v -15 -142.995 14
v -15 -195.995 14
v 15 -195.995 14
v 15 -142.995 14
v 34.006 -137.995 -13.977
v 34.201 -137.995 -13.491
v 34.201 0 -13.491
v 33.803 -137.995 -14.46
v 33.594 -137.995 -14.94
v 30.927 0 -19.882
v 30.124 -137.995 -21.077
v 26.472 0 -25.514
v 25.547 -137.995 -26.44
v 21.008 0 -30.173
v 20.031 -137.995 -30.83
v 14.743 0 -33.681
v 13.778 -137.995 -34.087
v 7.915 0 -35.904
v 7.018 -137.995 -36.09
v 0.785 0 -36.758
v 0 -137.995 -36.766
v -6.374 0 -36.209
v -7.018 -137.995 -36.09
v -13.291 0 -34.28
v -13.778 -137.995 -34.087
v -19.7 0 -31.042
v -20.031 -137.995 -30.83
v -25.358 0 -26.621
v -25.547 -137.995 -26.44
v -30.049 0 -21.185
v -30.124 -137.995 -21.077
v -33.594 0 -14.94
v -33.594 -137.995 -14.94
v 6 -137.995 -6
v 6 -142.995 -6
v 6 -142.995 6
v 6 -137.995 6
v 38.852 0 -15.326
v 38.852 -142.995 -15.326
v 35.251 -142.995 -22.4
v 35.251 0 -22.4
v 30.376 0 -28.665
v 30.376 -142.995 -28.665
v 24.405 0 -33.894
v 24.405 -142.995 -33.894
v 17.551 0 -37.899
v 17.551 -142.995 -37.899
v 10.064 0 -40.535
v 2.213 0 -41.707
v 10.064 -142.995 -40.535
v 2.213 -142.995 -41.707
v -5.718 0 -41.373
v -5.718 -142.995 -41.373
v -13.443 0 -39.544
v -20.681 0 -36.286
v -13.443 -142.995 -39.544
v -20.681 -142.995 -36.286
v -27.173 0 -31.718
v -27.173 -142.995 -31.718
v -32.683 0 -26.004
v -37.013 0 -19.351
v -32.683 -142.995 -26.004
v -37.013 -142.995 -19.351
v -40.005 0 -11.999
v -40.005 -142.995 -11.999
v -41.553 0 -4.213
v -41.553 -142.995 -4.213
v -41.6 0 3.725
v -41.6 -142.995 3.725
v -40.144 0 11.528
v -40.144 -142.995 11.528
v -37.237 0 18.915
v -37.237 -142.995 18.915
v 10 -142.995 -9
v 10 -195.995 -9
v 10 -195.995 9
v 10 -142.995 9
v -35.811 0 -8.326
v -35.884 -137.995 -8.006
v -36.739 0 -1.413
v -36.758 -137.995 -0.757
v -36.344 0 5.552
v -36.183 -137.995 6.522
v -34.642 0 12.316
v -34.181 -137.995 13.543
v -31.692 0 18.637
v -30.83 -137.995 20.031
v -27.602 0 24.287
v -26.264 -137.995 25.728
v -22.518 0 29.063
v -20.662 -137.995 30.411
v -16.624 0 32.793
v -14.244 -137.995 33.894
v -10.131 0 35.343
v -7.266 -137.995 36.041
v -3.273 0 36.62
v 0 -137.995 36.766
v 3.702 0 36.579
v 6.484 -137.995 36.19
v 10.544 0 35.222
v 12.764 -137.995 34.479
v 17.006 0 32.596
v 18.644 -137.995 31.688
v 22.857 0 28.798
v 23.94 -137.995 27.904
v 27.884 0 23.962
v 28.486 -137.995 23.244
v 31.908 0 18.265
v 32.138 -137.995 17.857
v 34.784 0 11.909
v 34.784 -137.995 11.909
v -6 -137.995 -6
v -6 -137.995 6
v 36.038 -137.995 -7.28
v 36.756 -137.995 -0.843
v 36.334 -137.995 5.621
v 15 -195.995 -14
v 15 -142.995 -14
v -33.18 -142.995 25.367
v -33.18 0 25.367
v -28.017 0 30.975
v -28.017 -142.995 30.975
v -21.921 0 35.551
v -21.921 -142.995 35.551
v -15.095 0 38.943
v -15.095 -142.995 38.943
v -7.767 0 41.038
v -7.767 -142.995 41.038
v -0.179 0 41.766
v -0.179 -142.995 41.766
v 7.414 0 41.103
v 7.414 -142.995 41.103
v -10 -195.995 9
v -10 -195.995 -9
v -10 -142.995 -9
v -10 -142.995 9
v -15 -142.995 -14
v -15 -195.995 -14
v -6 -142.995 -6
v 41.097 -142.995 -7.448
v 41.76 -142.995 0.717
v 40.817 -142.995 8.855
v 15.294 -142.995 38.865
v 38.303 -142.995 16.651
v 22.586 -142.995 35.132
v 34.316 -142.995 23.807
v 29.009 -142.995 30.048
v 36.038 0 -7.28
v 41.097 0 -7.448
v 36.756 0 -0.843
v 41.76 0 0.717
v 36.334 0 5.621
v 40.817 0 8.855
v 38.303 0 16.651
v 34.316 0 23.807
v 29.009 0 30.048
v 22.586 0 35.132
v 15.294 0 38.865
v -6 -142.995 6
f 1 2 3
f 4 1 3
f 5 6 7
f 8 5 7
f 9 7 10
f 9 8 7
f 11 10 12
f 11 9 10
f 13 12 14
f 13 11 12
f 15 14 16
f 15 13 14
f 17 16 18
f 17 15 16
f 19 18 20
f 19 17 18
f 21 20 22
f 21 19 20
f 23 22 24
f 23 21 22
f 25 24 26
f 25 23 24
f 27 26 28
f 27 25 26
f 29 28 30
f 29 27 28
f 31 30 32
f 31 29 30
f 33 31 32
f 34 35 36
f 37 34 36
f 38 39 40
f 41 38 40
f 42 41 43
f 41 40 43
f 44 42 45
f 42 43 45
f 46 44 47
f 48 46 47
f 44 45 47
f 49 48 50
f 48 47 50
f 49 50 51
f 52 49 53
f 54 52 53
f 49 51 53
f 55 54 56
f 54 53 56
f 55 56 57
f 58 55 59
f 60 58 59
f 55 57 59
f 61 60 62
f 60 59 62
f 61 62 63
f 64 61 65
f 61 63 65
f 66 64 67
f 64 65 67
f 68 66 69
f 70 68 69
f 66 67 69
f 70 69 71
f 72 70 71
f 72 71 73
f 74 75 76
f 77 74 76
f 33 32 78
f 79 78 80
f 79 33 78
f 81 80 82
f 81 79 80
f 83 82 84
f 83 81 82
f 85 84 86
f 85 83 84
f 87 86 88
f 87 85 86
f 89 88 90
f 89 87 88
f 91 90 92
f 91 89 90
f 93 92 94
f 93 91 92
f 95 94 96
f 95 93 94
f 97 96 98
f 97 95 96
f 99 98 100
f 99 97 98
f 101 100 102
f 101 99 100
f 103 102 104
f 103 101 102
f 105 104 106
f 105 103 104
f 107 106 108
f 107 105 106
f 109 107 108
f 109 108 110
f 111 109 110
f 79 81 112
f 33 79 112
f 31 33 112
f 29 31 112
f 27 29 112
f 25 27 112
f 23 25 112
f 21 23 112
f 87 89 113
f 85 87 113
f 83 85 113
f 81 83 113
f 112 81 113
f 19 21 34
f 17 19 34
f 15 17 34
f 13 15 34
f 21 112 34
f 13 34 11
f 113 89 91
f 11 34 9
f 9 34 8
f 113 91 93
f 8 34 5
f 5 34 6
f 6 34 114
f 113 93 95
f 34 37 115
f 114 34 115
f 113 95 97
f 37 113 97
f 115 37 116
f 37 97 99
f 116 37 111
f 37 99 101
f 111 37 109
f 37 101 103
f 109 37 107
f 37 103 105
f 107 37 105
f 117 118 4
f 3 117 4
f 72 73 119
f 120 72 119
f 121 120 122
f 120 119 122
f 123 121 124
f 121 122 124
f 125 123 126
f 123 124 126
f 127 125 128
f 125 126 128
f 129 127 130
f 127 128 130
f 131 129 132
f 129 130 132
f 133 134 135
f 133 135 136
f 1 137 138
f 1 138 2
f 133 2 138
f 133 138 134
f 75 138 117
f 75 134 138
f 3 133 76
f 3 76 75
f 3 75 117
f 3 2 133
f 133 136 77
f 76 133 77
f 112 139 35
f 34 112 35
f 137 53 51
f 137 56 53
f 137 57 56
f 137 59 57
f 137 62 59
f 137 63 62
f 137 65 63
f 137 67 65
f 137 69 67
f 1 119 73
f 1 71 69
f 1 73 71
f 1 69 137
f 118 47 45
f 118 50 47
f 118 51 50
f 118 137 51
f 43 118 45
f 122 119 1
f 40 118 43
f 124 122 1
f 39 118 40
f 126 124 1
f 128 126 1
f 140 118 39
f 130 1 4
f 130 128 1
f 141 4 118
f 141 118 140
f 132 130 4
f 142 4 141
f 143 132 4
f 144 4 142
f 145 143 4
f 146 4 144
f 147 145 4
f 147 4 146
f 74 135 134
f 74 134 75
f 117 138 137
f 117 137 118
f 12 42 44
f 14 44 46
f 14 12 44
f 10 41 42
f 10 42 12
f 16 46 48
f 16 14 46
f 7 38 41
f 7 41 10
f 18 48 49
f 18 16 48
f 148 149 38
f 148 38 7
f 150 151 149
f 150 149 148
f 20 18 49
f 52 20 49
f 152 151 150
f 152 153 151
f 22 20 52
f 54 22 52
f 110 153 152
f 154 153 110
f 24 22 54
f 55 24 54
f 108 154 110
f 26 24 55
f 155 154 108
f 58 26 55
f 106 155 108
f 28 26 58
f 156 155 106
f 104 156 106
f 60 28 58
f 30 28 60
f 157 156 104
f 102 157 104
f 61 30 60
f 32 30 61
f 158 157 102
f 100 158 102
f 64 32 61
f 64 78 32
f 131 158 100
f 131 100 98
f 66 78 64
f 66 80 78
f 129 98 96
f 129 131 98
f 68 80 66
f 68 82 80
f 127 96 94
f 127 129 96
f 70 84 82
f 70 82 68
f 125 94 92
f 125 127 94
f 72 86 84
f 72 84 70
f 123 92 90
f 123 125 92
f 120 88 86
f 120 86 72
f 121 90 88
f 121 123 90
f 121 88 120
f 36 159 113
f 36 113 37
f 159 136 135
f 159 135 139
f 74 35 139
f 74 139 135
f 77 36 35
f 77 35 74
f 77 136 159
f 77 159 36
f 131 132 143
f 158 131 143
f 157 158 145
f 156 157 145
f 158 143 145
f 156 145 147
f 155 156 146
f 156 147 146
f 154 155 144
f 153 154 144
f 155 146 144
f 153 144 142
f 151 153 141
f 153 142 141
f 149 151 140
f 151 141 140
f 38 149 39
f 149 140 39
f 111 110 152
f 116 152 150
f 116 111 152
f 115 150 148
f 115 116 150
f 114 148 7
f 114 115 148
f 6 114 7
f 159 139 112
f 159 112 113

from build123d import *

# Parameters (mm, degrees)
BOSS_EXTRUDE2_START = -142.995
BOSS_EXTRUDE2_DEPTH = 142.995
BOSS_EXTRUDE3_DEPTH = 5
CUT_EXTRUDE2_REACH  = 156.714
SKETCH5_W           = 12
SKETCH5_H           = 12
SKETCH6_W           = 30
SKETCH6_H           = 28
SKETCH6_W_2         = 20
SKETCH6_H_2         = 18
BOSS_EXTRUDE4_DEPTH = 53


with BuildPart() as part:
    # Sketch3 → Boss-Extrude2 (new body)
    with BuildSketch(Plane(origin=(0, 0, 0), x_dir=(-1, 0, 0), z_dir=(0, 1, 0)).offset(BOSS_EXTRUDE2_START)):
        with BuildLine():
            ThreePointArc((-7.414110804, 41.102672806), (-36.485572351, 20.327364833), (-38.852451785, -15.325982549))
            ThreePointArc((-38.852451785, -15.325982549), (17.139485086, -38.087226229), (37.237407808, 18.914920316))
            ThreePointArc((37.237407808, 18.914920316), (18.585783578, 37.402772619), (-7.414110804, 41.102672806))
        make_face()
        with BuildLine():
            ThreePointArc((-34.201246039, -13.49123867), (-0.785346896, -36.757611208), (33.593802773, -14.939717757))
            ThreePointArc((33.593802773, -14.939717757), (13.43775935, 34.22229354), (-34.78367135, 11.909448303))
            ThreePointArc((-34.78367135, 11.909448303), (-36.756338657, -0.842804842), (-34.201246039, -13.49123867))
        make_face(mode=Mode.SUBTRACT)
    extrude(amount=BOSS_EXTRUDE2_DEPTH)

    # Sketch4 → Boss-Extrude3 (add)
    with BuildSketch(Plane.XZ.offset(142.99499992)):
        with BuildLine():
            ThreePointArc((0, 36.765999938), (-30.83028068, -20.030789916), (33.593802773, -14.939717757))
            ThreePointArc((33.593802773, -14.939717757), (30.83028068, 20.030789916), (0, 36.765999938))
        make_face()
    extrude(amount=-BOSS_EXTRUDE3_DEPTH)

    # Sketch5 → Cut-Extrude2 (cut, up to next)
    with BuildSketch(Plane.XZ.offset(142.99499992), mode=Mode.PRIVATE) as cut_extrude2_sk1:
        Rectangle(SKETCH5_W, SKETCH5_H)
    cut_extrude2_tool1 = extrude(cut_extrude2_sk1.sketch, amount=-CUT_EXTRUDE2_REACH, mode=Mode.PRIVATE) & part.part
    add(cut_extrude2_tool1.solids().sort_by_distance((0, -142.995, 0))[0], mode=Mode.SUBTRACT)

    # Sketch6 → Boss-Extrude4 (add)
    with BuildSketch(Plane.XZ.offset(142.99499992)):
        Rectangle(SKETCH6_W, SKETCH6_H)
        Rectangle(SKETCH6_W_2, SKETCH6_H_2, mode=Mode.SUBTRACT)
    extrude(amount=BOSS_EXTRUDE4_DEPTH)


solid = part.part
